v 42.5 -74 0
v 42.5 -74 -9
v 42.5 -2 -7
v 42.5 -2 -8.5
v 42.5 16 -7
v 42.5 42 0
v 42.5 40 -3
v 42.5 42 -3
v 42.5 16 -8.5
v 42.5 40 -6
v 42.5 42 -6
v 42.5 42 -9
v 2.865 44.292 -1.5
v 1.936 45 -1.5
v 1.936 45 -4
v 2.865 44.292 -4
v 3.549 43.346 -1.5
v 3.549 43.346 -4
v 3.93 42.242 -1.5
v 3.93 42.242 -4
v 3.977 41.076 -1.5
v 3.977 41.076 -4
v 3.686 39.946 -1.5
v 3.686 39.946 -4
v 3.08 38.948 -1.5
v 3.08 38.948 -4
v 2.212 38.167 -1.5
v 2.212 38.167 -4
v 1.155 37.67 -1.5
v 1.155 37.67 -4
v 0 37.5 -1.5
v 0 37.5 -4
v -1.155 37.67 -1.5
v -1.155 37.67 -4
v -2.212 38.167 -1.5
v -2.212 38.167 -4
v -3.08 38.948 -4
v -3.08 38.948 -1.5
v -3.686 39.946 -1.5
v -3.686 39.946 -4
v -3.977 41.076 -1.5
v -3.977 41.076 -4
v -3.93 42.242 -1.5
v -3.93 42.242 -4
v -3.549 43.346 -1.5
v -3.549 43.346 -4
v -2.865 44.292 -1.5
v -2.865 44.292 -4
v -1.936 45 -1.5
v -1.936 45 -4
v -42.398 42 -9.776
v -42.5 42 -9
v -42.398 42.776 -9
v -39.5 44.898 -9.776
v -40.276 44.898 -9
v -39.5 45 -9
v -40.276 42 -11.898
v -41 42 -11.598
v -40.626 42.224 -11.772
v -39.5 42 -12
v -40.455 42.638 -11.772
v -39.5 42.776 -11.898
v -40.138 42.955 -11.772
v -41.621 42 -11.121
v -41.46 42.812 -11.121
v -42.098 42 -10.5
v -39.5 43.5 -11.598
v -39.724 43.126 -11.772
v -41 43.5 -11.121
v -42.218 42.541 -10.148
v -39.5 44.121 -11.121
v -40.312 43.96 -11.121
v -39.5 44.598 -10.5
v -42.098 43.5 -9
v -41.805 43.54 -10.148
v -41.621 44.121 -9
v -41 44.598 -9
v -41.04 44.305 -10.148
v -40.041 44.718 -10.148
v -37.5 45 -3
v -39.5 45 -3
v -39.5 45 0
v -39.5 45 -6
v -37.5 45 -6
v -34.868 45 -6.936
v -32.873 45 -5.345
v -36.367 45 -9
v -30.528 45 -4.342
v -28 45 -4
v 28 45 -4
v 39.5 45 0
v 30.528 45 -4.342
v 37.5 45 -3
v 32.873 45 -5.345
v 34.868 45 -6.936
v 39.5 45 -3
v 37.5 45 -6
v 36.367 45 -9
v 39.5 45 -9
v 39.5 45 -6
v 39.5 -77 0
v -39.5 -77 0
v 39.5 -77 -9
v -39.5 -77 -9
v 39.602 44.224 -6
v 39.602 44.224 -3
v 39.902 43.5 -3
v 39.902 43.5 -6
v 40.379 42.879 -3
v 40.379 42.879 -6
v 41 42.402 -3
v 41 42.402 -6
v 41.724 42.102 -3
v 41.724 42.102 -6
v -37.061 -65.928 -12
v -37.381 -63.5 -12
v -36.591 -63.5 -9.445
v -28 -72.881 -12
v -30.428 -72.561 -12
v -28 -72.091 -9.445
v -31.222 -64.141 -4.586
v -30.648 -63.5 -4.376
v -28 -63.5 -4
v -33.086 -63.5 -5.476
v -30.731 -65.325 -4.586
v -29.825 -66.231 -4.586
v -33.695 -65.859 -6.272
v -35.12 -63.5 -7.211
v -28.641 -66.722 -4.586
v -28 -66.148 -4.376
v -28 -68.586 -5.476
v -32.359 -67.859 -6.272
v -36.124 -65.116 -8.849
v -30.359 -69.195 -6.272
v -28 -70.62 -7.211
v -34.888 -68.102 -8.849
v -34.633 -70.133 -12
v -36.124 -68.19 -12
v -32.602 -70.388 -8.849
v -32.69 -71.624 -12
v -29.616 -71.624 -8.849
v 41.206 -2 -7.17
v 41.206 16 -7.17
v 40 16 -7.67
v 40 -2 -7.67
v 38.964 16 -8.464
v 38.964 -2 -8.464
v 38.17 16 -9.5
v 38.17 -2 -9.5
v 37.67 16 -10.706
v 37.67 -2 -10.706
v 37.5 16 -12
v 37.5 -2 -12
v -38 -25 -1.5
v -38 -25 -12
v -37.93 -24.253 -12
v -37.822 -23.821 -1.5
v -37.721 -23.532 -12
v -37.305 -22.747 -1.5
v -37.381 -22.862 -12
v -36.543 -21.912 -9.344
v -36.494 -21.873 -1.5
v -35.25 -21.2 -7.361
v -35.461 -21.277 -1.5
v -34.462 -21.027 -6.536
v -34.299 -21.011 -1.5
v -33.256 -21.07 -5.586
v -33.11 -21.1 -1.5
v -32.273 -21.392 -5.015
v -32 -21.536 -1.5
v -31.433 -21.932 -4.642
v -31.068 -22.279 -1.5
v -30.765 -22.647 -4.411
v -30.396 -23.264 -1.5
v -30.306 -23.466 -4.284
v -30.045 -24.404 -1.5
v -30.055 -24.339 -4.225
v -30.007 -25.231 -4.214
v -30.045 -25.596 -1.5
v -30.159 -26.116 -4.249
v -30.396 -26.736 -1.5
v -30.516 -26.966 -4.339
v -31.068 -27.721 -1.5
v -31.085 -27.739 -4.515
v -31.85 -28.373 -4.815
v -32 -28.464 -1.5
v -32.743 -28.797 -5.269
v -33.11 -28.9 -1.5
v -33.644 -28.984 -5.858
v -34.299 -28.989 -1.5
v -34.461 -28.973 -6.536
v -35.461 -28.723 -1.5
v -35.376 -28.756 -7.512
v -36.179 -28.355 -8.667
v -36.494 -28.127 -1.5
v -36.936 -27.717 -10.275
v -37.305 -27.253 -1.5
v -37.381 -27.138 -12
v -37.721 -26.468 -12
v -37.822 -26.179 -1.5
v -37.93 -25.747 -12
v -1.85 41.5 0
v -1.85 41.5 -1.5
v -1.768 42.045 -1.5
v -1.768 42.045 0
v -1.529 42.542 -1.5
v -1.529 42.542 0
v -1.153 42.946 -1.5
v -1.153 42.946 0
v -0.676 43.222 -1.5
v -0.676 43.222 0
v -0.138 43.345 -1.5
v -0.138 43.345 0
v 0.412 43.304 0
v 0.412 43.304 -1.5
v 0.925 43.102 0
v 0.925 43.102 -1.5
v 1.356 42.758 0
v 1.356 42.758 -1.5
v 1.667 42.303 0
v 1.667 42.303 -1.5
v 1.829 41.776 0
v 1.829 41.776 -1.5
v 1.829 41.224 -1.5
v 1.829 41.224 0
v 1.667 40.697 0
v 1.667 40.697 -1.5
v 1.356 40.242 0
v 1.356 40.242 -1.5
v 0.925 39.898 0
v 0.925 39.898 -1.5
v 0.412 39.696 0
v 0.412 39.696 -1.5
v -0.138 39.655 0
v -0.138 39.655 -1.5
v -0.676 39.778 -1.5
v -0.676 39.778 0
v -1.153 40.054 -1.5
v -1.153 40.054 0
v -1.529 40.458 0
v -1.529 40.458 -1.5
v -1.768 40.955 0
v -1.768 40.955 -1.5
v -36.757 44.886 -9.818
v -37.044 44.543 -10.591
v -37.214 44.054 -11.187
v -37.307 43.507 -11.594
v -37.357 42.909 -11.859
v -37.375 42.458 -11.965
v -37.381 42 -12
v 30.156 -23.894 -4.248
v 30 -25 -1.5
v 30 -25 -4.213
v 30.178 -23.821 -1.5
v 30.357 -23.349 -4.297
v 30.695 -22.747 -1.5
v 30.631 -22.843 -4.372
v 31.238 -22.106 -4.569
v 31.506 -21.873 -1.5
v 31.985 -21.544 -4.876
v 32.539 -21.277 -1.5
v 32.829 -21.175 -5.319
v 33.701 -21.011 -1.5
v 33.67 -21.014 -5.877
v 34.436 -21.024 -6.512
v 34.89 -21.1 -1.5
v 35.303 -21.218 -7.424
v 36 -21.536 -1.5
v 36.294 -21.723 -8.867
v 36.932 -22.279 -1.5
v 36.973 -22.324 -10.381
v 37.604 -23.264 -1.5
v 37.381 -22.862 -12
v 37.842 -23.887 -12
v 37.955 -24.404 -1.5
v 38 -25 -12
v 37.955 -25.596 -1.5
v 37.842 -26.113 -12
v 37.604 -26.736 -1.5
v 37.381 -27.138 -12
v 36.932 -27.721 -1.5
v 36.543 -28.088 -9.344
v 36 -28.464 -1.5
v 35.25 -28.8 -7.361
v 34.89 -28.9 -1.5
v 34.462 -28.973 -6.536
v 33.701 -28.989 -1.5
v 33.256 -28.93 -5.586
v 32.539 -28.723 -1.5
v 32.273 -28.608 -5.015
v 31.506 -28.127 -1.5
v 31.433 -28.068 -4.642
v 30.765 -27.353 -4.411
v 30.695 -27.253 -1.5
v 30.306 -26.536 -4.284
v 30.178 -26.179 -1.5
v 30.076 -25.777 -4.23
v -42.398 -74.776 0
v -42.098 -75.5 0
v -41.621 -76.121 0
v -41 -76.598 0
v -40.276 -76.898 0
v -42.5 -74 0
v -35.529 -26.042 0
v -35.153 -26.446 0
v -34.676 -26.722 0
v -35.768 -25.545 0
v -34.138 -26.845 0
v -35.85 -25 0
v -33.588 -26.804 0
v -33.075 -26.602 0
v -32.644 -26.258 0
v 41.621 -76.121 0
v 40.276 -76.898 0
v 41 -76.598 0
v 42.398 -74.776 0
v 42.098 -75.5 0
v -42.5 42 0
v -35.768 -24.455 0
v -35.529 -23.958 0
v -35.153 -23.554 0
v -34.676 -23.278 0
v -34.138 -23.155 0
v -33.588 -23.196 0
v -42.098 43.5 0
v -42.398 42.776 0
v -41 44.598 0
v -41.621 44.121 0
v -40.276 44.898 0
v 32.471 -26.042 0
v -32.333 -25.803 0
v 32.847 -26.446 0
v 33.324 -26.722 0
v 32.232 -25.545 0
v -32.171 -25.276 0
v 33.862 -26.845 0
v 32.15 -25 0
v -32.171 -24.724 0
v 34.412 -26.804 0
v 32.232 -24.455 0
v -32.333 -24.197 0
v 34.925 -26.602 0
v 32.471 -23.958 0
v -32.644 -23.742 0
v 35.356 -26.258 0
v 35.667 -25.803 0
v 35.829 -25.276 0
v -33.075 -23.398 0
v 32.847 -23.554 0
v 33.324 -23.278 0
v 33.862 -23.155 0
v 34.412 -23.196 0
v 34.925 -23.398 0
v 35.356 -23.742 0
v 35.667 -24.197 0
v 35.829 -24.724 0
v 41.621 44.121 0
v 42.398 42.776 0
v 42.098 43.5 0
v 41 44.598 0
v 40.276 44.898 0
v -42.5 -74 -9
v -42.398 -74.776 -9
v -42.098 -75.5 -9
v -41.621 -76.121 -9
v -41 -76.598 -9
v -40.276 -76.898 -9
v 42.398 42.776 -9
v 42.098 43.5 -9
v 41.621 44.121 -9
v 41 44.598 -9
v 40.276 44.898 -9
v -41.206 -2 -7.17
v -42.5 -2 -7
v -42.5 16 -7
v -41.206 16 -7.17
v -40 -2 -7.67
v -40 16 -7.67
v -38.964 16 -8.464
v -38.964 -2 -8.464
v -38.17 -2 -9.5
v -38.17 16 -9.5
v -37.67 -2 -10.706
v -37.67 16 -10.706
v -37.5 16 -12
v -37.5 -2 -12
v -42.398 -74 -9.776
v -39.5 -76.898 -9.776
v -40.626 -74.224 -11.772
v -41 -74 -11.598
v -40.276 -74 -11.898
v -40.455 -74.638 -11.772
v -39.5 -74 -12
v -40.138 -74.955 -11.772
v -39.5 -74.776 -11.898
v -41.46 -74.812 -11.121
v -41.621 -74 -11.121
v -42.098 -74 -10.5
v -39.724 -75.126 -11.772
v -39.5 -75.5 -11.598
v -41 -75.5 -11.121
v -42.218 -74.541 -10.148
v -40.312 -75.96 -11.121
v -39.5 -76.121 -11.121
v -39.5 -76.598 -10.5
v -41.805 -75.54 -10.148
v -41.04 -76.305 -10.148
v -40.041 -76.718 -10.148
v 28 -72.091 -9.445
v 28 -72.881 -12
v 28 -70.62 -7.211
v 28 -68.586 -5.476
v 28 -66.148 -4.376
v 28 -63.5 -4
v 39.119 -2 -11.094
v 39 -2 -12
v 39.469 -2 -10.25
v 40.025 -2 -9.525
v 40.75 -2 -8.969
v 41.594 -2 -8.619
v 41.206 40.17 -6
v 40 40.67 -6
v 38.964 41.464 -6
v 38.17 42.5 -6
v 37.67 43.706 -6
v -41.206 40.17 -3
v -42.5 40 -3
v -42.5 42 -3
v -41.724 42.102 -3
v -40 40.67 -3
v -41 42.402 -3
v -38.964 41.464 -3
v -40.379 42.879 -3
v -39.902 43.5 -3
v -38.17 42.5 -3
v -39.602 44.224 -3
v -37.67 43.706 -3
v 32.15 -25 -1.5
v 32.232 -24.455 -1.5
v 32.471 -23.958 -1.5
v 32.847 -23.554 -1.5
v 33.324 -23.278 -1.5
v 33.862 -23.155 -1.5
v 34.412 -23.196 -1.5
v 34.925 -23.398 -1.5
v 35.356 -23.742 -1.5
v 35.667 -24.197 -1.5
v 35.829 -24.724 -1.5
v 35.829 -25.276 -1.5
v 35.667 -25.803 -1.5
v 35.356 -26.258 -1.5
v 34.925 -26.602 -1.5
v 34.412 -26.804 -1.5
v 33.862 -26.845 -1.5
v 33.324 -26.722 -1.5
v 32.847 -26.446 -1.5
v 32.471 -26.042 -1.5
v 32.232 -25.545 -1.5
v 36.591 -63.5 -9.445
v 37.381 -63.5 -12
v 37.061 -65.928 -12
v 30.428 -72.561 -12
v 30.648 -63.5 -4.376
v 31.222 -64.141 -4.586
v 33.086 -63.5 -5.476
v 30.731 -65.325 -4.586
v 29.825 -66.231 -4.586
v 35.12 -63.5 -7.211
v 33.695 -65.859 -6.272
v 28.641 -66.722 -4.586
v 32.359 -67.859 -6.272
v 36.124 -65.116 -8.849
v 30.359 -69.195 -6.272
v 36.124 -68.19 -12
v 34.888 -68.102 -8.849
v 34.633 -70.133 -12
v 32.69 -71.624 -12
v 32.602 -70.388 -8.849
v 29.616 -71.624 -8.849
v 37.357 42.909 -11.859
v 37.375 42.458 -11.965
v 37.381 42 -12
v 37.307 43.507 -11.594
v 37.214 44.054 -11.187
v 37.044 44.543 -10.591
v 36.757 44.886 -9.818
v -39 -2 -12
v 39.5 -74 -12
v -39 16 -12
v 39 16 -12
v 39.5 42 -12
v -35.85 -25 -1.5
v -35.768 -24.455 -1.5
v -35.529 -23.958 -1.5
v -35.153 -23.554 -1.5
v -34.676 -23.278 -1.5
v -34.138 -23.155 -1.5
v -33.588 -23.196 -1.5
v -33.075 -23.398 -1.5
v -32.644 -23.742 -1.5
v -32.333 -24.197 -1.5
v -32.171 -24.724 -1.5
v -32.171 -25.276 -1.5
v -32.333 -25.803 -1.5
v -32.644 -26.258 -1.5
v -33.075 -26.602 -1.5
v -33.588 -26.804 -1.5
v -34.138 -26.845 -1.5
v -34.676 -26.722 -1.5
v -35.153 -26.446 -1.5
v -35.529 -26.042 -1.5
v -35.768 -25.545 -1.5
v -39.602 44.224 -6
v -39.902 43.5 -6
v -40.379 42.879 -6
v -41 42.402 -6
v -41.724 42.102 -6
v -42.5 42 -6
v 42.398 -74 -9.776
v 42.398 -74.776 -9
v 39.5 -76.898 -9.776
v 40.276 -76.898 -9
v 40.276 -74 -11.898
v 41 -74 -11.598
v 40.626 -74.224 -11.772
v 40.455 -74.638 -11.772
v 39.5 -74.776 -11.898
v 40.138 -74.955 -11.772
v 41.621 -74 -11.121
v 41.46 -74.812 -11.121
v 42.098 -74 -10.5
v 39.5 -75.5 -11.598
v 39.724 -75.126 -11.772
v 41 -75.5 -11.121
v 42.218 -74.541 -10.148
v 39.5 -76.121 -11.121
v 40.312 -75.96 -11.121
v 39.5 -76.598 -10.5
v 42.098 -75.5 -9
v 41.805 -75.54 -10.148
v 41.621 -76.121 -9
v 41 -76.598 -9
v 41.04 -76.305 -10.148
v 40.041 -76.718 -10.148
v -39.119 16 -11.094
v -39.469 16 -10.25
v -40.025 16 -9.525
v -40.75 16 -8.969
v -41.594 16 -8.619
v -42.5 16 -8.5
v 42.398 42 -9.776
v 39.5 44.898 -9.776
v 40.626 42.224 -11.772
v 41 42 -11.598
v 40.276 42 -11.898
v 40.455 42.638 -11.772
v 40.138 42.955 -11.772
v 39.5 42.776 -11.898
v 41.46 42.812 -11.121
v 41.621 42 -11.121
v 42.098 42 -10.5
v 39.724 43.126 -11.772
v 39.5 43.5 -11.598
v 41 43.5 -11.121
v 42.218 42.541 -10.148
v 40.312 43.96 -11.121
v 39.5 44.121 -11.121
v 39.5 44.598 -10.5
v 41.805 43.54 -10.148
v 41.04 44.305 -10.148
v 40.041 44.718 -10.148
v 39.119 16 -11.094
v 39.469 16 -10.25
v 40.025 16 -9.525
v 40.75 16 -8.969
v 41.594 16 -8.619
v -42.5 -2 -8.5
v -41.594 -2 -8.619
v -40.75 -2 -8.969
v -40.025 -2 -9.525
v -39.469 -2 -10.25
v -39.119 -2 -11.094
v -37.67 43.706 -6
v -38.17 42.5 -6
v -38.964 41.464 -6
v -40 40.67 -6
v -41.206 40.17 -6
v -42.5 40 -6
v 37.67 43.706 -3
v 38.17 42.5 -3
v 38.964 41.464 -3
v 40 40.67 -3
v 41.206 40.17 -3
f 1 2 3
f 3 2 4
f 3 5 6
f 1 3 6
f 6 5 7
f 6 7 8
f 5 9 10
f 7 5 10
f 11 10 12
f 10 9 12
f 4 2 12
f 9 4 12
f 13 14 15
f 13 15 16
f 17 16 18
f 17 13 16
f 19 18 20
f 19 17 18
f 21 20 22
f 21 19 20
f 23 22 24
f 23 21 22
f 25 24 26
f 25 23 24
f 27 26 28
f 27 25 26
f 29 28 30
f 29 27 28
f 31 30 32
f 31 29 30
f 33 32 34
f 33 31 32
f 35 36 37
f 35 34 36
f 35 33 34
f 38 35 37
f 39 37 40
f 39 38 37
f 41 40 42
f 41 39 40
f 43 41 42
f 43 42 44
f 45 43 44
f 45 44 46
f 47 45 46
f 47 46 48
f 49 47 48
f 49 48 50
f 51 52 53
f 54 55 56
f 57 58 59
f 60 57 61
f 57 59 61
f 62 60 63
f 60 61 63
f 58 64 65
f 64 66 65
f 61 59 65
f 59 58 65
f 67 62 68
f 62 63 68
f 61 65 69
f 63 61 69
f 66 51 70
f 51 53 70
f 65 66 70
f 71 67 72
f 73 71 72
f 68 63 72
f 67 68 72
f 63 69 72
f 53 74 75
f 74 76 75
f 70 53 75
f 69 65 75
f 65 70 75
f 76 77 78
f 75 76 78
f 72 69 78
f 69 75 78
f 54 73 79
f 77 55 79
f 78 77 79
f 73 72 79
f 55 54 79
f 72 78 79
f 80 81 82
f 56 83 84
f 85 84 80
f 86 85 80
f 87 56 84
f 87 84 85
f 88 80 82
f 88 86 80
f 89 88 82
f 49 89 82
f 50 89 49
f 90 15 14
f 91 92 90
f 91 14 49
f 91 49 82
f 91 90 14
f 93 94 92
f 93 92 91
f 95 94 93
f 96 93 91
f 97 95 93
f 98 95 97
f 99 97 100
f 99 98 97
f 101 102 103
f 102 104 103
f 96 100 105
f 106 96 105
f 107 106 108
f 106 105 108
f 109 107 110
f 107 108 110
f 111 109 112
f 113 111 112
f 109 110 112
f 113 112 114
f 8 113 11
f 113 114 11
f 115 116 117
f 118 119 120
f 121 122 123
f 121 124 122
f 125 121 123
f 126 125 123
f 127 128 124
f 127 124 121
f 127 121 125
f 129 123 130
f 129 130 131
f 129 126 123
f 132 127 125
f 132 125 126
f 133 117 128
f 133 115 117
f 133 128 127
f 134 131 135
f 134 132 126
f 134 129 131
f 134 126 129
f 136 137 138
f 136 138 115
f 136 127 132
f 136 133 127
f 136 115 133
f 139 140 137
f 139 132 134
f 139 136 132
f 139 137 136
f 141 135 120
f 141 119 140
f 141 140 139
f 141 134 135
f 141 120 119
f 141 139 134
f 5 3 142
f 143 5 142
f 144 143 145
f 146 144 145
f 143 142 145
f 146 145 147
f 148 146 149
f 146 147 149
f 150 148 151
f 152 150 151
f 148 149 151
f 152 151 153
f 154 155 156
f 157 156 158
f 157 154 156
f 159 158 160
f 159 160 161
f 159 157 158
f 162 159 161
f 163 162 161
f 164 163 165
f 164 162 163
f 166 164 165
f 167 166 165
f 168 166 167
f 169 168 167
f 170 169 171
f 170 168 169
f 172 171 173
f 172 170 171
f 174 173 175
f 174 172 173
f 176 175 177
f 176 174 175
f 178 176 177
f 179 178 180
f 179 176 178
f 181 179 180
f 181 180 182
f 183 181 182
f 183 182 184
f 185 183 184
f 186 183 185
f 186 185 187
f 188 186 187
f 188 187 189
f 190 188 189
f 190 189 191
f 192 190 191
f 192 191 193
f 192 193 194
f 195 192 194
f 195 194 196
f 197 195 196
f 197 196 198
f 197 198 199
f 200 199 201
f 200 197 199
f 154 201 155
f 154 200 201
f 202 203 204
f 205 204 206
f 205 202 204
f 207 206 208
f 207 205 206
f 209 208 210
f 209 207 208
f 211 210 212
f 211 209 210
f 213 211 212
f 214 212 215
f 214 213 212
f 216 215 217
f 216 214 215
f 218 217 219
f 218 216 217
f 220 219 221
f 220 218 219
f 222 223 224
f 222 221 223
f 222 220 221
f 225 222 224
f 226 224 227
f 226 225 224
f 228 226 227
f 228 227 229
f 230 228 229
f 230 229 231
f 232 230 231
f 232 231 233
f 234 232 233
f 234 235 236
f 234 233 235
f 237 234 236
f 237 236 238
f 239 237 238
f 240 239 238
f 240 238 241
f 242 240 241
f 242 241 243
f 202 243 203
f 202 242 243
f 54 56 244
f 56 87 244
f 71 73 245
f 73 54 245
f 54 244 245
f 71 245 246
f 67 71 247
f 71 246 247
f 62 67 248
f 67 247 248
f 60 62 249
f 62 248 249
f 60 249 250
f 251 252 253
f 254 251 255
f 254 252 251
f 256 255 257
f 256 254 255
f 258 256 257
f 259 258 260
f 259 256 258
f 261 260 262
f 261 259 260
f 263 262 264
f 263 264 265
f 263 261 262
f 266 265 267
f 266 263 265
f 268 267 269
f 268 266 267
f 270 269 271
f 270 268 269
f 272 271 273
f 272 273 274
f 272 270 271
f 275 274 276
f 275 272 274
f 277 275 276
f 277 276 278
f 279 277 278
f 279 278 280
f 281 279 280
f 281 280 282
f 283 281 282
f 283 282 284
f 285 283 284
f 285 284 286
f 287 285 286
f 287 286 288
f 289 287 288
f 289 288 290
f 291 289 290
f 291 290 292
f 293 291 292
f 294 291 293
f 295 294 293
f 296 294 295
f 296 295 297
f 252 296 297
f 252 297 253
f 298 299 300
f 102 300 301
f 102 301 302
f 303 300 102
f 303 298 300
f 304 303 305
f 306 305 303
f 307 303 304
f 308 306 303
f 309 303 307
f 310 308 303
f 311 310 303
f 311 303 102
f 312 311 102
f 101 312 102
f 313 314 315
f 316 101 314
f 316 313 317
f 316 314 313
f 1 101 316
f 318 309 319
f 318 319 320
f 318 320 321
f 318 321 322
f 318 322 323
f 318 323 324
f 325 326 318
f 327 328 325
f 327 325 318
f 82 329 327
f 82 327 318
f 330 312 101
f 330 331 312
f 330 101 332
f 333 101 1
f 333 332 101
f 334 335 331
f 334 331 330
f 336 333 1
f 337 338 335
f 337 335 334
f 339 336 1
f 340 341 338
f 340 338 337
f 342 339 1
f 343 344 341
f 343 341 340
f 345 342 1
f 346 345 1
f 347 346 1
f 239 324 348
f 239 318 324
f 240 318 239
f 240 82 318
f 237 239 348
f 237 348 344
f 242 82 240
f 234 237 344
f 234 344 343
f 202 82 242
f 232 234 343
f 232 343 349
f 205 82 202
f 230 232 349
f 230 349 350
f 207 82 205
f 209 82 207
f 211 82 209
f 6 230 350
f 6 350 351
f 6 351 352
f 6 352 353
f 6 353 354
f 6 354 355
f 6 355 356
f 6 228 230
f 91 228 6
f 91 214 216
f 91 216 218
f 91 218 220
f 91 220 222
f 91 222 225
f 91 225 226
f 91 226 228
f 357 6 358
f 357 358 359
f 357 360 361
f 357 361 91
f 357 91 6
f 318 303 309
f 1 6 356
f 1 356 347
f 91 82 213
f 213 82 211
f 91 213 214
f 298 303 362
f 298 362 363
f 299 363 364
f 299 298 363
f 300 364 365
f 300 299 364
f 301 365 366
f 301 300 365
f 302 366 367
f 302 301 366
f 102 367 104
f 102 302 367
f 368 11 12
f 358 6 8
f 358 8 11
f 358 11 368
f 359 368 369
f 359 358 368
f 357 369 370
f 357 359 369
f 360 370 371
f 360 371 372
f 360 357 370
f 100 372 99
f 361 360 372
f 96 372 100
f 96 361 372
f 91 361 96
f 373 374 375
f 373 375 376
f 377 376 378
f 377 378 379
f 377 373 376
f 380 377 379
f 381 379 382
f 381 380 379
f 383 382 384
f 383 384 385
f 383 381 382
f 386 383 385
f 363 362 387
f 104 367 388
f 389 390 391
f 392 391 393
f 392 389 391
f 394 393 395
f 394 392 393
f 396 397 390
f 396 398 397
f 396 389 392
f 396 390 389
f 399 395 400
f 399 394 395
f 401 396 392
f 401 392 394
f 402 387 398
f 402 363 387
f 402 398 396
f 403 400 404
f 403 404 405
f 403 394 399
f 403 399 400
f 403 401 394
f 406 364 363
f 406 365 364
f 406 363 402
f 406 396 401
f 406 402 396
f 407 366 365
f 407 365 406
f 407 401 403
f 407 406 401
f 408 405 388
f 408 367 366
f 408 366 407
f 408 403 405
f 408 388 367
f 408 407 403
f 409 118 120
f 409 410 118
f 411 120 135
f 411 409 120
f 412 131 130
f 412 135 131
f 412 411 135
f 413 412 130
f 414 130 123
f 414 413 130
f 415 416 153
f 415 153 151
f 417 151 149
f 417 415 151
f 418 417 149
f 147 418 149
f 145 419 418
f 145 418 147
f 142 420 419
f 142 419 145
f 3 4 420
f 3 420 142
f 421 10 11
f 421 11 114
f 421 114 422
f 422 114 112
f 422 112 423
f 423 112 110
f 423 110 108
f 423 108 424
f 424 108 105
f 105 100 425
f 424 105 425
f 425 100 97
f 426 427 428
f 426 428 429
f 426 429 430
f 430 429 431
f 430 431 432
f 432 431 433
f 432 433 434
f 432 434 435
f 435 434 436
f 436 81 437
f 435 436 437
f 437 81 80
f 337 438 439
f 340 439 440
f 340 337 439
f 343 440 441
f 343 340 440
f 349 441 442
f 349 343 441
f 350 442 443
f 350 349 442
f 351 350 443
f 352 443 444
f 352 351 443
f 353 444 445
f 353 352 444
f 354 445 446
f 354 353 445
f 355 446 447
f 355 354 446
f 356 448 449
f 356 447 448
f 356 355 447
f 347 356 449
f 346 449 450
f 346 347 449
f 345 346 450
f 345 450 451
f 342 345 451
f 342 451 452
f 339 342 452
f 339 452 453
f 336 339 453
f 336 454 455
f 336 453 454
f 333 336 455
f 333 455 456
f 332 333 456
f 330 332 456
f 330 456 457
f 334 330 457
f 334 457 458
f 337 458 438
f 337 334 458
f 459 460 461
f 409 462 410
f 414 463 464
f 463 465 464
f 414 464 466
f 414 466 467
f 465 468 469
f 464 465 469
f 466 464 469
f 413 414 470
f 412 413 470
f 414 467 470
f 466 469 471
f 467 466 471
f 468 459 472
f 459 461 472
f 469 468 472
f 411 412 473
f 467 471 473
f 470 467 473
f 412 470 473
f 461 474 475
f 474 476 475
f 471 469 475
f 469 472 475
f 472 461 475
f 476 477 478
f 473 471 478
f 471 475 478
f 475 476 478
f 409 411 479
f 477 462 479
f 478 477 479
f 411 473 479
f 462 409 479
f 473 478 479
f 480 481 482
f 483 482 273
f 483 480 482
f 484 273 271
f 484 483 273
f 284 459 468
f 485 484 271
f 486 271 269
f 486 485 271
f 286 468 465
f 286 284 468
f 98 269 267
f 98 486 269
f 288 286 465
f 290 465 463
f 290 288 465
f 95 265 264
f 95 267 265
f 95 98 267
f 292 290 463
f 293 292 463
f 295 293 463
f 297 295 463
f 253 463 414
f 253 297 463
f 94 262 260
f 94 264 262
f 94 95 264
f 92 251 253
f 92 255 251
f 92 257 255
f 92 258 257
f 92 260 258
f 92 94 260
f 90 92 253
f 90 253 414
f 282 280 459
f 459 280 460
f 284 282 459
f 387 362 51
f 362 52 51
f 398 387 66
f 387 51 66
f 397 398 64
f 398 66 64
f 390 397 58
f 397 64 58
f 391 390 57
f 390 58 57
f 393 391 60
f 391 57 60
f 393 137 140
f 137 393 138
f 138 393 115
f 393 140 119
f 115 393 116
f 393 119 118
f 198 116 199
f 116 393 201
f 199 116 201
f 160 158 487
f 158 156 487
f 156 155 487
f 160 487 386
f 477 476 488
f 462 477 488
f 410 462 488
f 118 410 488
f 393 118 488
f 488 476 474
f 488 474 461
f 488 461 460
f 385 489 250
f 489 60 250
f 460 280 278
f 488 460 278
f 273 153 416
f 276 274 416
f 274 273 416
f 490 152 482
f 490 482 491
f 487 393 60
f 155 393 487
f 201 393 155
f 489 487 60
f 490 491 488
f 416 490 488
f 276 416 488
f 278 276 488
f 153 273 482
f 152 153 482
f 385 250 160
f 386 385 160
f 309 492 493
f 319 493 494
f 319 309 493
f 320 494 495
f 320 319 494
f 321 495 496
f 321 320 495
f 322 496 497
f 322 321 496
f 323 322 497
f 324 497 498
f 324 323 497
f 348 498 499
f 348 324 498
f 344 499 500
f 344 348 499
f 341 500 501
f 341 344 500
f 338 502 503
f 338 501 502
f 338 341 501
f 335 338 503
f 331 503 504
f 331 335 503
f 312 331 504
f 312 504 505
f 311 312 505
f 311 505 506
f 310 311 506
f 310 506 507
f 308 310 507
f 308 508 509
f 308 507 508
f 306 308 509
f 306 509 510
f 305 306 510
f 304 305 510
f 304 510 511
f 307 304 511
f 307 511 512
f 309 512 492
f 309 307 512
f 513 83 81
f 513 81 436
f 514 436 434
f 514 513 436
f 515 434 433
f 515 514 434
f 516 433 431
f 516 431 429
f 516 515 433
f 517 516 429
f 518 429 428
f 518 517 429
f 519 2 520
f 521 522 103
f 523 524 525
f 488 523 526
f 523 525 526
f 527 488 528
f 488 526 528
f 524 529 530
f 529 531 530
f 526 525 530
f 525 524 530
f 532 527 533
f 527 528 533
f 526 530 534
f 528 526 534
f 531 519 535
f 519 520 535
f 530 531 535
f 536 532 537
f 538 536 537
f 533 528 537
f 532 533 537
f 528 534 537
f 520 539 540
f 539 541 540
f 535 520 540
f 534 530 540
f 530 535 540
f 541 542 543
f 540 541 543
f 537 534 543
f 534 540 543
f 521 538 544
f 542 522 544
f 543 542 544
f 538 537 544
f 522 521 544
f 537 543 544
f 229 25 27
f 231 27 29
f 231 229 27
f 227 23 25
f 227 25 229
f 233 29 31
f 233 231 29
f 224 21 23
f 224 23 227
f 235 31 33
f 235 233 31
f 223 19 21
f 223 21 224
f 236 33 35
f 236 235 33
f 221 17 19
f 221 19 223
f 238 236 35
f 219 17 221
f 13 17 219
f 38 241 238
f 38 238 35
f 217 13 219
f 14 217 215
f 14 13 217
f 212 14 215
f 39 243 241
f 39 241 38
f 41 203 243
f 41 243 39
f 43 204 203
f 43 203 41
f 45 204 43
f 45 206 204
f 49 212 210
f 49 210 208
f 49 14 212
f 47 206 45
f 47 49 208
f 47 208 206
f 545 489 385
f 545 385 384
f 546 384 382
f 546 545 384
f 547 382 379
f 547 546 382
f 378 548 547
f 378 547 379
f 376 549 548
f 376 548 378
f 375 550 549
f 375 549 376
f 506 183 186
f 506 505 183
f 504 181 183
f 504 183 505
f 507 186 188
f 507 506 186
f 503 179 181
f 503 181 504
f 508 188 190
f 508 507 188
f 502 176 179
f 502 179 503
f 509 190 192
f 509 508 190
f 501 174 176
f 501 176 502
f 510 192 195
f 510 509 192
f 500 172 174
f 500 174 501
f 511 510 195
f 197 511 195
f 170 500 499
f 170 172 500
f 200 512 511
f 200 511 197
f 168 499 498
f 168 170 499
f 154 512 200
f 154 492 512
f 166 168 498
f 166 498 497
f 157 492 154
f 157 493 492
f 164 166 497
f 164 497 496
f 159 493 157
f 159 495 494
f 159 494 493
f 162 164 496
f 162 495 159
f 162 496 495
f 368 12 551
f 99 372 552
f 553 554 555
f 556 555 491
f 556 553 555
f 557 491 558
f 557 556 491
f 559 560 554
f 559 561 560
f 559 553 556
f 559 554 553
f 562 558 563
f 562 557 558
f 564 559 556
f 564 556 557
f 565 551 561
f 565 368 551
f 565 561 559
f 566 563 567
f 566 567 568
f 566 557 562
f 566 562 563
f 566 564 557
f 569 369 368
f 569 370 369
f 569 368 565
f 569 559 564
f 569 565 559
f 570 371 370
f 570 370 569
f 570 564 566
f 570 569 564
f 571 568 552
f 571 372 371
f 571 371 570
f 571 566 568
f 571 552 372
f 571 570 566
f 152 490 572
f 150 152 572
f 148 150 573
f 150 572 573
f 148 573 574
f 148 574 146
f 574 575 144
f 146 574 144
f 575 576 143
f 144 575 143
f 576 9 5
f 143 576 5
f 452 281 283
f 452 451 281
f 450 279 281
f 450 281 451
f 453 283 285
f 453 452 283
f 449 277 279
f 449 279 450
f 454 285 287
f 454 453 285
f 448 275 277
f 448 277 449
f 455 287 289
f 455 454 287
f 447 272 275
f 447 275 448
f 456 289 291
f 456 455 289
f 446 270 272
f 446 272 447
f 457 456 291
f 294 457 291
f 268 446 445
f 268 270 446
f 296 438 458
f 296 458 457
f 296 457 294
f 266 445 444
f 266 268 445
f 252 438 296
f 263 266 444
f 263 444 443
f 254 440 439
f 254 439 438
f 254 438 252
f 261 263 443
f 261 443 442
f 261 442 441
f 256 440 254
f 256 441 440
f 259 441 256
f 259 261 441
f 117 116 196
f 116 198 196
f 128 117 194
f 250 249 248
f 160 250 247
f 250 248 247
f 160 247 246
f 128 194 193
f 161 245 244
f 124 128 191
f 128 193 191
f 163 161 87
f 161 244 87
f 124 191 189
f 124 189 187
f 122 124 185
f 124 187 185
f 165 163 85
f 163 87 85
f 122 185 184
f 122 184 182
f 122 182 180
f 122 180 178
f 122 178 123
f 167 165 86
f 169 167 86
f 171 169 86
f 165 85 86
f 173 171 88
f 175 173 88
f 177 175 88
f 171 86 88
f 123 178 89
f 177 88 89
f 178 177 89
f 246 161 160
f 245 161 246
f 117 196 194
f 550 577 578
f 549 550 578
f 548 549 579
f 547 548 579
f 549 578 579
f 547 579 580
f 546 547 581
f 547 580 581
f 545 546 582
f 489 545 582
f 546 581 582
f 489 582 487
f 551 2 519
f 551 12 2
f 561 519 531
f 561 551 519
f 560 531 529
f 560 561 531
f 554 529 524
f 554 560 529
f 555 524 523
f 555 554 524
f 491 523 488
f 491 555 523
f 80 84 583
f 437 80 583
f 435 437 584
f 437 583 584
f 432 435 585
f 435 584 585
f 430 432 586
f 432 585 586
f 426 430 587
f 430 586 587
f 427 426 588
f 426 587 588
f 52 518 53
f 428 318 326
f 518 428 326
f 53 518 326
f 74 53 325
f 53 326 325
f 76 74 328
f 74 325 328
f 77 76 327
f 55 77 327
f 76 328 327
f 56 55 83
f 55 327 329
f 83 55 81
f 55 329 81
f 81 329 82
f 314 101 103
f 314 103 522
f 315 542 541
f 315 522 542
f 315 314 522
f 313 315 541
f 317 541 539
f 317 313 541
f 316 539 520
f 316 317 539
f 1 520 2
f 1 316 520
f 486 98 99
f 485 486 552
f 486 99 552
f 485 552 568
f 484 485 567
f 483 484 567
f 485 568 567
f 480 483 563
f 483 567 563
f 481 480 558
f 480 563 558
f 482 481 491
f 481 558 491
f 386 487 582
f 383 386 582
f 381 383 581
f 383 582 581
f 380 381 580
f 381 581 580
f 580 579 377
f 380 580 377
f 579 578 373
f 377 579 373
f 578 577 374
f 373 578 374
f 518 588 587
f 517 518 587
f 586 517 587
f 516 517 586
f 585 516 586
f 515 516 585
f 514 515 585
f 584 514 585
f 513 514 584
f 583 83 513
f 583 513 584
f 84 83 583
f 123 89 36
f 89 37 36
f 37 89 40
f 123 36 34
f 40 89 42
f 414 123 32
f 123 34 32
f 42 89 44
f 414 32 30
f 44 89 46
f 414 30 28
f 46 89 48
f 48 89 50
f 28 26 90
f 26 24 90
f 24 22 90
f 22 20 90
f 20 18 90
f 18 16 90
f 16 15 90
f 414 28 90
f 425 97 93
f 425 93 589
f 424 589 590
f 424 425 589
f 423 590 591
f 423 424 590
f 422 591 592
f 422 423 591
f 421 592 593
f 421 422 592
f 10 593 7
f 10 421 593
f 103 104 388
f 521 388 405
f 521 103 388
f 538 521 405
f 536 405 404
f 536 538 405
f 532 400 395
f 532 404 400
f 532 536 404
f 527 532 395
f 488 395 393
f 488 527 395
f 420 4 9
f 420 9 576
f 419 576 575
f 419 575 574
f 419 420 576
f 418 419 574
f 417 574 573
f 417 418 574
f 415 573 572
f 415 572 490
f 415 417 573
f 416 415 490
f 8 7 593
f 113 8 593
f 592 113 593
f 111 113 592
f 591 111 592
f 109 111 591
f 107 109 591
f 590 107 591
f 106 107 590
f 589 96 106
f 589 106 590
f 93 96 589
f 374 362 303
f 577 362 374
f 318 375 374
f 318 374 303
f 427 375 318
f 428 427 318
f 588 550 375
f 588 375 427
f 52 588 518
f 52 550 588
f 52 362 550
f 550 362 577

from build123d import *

# Parameters (mm, degrees)
EXTRUDE032_DEPTH           = 3
EXTRUDE033_DEPTH           = 3
CYLINDER057_R              = 4
CYLINDER057_DEPTH          = 12
CYLINDER055_R              = 4
CYLINDER055_DEPTH          = 12
CYLINDER053_R              = 1.85
CYLINDER053_DEPTH          = 12
CYLINDER054_R              = 1.85
CYLINDER054_DEPTH          = 12
CYLINDER056_R              = 4
CYLINDER056_DEPTH          = 12
CYLINDER052_R              = 1.85
CYLINDER052_DEPTH          = 12
EXTRUDE035_DEPTH           = 18
EXTRUDE035_PLACEMENT_ANGLE = 90
EXTRUDE034_DEPTH           = 18
EXTRUDE034_PLACEMENT_ANGLE = 90
BOX019_W                   = 75
BOX019_H                   = 150
BOX019_DEPTH               = 25
FILLET017_R                = 9.5
BOX018_W                   = 85
BOX018_H                   = 122
BOX018_DEPTH               = 12
FILLET016_R                = 3


with BuildPart() as batterybackattachpocket:
    # Sketch007 → Extrude032 (new body)
    with BuildSketch(Plane.XY):
        with BuildLine():
            ThreePointArc((-3, 0), (-2.12132, -2.12132), (0, -3))
            Line((0, -3), (0, -5))
            ThreePointArc((-5, 0), (-3.535534, -3.535534), (0, -5))
            Line((-5, 0), (-3, 0))
        make_face()
    extrude(amount=EXTRUDE032_DEPTH)


with BuildPart() as batterybackattachpocket_1:
    # Extrude032 placement: moved
    add(batterybackattachpocket.part.moved(Location((42.5, 45, -6))))


with BuildPart() as batterybackattachpocketleft:
    # Part__Mirroring004: instance of BatteryBackAttachPocket
    add(batterybackattachpocket_1.part.mirror(Plane(origin=(0, 0, 0), x_dir=(0, -1, 0), z_dir=(1, 0, 0))))


with BuildPart() as batterybackattachpocketright:
    # Sketch008 → Extrude033 (new body)
    with BuildSketch(Plane.XY):
        with BuildLine():
            ThreePointArc((-3, 0), (-2.12132, -2.12132), (0, -3))
            Line((0, -3), (0, -5))
            ThreePointArc((-5, 0), (-3.535534, -3.535534), (0, -5))
            Line((-5, 0), (-3, 0))
        make_face()
    extrude(amount=EXTRUDE033_DEPTH)


with BuildPart() as batterybackattachpocketright_1:
    # Extrude033 placement: moved
    add(batterybackattachpocketright.part.moved(Location((42.5, 45, -6))))


with BuildPart() as batterybackscrewcountersink3:
    # Cylinder057 → Cylinder057 (new body)
    with BuildSketch(Plane(origin=(34, -25, -1.5), x_dir=(-1, 0, 0), z_dir=(0, 0, -1))):
        Circle(CYLINDER057_R)
    extrude(amount=CYLINDER057_DEPTH)


with BuildPart() as batterybackscrewcountersink1:
    # Cylinder055 → Cylinder055 (new body)
    with BuildSketch(Plane(origin=(0, 41.5, -1.5), x_dir=(-1, 0, 0), z_dir=(0, 0, -1))):
        Circle(CYLINDER055_R)
    extrude(amount=CYLINDER055_DEPTH)


with BuildPart() as batterybackscrewhole2:
    # Cylinder053 → Cylinder053 (new body)
    with BuildSketch(Plane(origin=(-34, -25, 0), x_dir=(-1, 0, 0), z_dir=(0, 0, -1))):
        Circle(CYLINDER053_R)
    extrude(amount=CYLINDER053_DEPTH)


with BuildPart() as batterybackscrewhole3:
    # Cylinder054 → Cylinder054 (new body)
    with BuildSketch(Plane(origin=(34, -25, 0), x_dir=(-1, 0, 0), z_dir=(0, 0, -1))):
        Circle(CYLINDER054_R)
    extrude(amount=CYLINDER054_DEPTH)


with BuildPart() as batterybackscrewcountersink2:
    # Cylinder056 → Cylinder056 (new body)
    with BuildSketch(Plane(origin=(-34, -25, -1.5), x_dir=(-1, 0, 0), z_dir=(0, 0, -1))):
        Circle(CYLINDER056_R)
    extrude(amount=CYLINDER056_DEPTH)


with BuildPart() as batterymountingpockets:
    # Cylinder052 → Cylinder052 (new body)
    with BuildSketch(Plane(origin=(0, 41.5, 0), x_dir=(-1, 0, 0), z_dir=(0, 0, -1))):
        Circle(CYLINDER052_R)
    extrude(amount=CYLINDER052_DEPTH)

    # Fusion048: union BatteryBackScrewCountersink3, BatteryBackScrewCountersink1, BatteryBackScrewHole2, BatteryBackScrewHole3, BatteryBackScrewCountersink2
    add(batterybackscrewcountersink3.part)
    add(batterybackscrewcountersink1.part)
    add(batterybackscrewhole2.part)
    add(batterybackscrewhole3.part)
    add(batterybackscrewcountersink2.part)


with BuildPart() as batterybackstrappocketleft:
    # Sketch010 → Extrude035 (new body)
    with BuildSketch(Plane.XZ):
        with BuildLine():
            ThreePointArc((-3.5, 0), (-2.474874, -2.474874), (0, -3.5))
            Line((0, -3.5), (0, -5))
            ThreePointArc((-5, 0), (-3.535534, -3.535534), (0, -5))
            Line((-5, 0), (-3.5, 0))
        make_face()
    extrude(amount=-EXTRUDE035_DEPTH)


with BuildPart() as batterybackstrappocketleft_1:
    # Extrude035 placement: moved
    add(batterybackstrappocketleft.part.moved(Location((42.5, -2, -12))).rotate(Axis((42.5, -2, -12), (0, 1, 0)), EXTRUDE035_PLACEMENT_ANGLE))


with BuildPart() as batterybackstrappocket:
    # Sketch009 → Extrude034 (new body)
    with BuildSketch(Plane.XZ):
        with BuildLine():
            ThreePointArc((-3.5, 0), (-2.474874, -2.474874), (0, -3.5))
            Line((0, -3.5), (0, -5))
            ThreePointArc((-5, 0), (-3.535534, -3.535534), (0, -5))
            Line((-5, 0), (-3.5, 0))
        make_face()
    extrude(amount=-EXTRUDE034_DEPTH)


with BuildPart() as batterybackstrappocket_1:
    # Extrude034 placement: moved
    add(batterybackstrappocket.part.moved(Location((42.5, -2, -12))).rotate(Axis((42.5, -2, -12), (0, 1, 0)), EXTRUDE034_PLACEMENT_ANGLE))


with BuildPart() as batterybackstrappocketright:
    # Part__Mirroring005: instance of BatteryBackStrapPocket
    add(batterybackstrappocket_1.part.mirror(Plane(origin=(0, 0, 0), x_dir=(0, -1, 0), z_dir=(1, 0, 0))))


with BuildPart() as batterybackcombinedpockets:
    # Box019 → Box019 (new body)
    with BuildSketch(Plane(origin=(-37.5, -73, -29), x_dir=(1, 0, 0), z_dir=(0, 0, 1))):
        with Locations((37.5, 75)):
            Rectangle(BOX019_W, BOX019_H)
    extrude(amount=BOX019_DEPTH)

    # Fillet017
    fillet017_edges = [batterybackcombinedpockets.edges().sort_by_distance(p)[0] for p in [
        (-37.5, -73, -16.5),
        (-37.5, 2, -4),
        (-37.5, 77, -16.5),
        (-37.5, 2, -29),
        (37.5, -73, -16.5),
        (37.5, 2, -4),
        (37.5, 77, -16.5),
        (37.5, 2, -29),
        (0, -73, -29),
        (0, -73, -4),
        (0, 77, -29),
        (0, 77, -4),
    ]]
    fillet(fillet017_edges, radius=FILLET017_R)

    # Fusion049: union BatteryBackAttachPocketLeft, BatteryBackAttachPocketRight, BatteryMountingPockets, BatteryBackStrapPocketLeft, BatteryBackStrapPocketRight
    add(batterybackattachpocketleft.part)
    add(batterybackattachpocketright_1.part)
    add(batterymountingpockets.part)
    add(batterybackstrappocketleft_1.part)
    add(batterybackstrappocketright.part)


with BuildPart() as toplevelpart_battteryback:
    # Box018 → Box018 (new body)
    with BuildSketch(Plane(origin=(-42.5, -77, -12), x_dir=(1, 0, 0), z_dir=(0, 0, 1))):
        with Locations((42.5, 61)):
            Rectangle(BOX018_W, BOX018_H)
    extrude(amount=BOX018_DEPTH)

    # Fillet016
    fillet016_edges = [toplevelpart_battteryback.edges().sort_by_distance(p)[0] for p in [
        (-42.5, -77, -6),
        (-42.5, 45, -6),
        (-42.5, -16, -12),
        (42.5, -77, -6),
        (42.5, 45, -6),
        (42.5, -16, -12),
        (0, -77, -12),
        (0, 45, -12),
    ]]
    fillet(fillet016_edges, radius=FILLET016_R)

    # Cut013: cut BatteryBackCombinedPockets
    add(batterybackcombinedpockets.part, mode=Mode.SUBTRACT)


solid = toplevelpart_battteryback.part
